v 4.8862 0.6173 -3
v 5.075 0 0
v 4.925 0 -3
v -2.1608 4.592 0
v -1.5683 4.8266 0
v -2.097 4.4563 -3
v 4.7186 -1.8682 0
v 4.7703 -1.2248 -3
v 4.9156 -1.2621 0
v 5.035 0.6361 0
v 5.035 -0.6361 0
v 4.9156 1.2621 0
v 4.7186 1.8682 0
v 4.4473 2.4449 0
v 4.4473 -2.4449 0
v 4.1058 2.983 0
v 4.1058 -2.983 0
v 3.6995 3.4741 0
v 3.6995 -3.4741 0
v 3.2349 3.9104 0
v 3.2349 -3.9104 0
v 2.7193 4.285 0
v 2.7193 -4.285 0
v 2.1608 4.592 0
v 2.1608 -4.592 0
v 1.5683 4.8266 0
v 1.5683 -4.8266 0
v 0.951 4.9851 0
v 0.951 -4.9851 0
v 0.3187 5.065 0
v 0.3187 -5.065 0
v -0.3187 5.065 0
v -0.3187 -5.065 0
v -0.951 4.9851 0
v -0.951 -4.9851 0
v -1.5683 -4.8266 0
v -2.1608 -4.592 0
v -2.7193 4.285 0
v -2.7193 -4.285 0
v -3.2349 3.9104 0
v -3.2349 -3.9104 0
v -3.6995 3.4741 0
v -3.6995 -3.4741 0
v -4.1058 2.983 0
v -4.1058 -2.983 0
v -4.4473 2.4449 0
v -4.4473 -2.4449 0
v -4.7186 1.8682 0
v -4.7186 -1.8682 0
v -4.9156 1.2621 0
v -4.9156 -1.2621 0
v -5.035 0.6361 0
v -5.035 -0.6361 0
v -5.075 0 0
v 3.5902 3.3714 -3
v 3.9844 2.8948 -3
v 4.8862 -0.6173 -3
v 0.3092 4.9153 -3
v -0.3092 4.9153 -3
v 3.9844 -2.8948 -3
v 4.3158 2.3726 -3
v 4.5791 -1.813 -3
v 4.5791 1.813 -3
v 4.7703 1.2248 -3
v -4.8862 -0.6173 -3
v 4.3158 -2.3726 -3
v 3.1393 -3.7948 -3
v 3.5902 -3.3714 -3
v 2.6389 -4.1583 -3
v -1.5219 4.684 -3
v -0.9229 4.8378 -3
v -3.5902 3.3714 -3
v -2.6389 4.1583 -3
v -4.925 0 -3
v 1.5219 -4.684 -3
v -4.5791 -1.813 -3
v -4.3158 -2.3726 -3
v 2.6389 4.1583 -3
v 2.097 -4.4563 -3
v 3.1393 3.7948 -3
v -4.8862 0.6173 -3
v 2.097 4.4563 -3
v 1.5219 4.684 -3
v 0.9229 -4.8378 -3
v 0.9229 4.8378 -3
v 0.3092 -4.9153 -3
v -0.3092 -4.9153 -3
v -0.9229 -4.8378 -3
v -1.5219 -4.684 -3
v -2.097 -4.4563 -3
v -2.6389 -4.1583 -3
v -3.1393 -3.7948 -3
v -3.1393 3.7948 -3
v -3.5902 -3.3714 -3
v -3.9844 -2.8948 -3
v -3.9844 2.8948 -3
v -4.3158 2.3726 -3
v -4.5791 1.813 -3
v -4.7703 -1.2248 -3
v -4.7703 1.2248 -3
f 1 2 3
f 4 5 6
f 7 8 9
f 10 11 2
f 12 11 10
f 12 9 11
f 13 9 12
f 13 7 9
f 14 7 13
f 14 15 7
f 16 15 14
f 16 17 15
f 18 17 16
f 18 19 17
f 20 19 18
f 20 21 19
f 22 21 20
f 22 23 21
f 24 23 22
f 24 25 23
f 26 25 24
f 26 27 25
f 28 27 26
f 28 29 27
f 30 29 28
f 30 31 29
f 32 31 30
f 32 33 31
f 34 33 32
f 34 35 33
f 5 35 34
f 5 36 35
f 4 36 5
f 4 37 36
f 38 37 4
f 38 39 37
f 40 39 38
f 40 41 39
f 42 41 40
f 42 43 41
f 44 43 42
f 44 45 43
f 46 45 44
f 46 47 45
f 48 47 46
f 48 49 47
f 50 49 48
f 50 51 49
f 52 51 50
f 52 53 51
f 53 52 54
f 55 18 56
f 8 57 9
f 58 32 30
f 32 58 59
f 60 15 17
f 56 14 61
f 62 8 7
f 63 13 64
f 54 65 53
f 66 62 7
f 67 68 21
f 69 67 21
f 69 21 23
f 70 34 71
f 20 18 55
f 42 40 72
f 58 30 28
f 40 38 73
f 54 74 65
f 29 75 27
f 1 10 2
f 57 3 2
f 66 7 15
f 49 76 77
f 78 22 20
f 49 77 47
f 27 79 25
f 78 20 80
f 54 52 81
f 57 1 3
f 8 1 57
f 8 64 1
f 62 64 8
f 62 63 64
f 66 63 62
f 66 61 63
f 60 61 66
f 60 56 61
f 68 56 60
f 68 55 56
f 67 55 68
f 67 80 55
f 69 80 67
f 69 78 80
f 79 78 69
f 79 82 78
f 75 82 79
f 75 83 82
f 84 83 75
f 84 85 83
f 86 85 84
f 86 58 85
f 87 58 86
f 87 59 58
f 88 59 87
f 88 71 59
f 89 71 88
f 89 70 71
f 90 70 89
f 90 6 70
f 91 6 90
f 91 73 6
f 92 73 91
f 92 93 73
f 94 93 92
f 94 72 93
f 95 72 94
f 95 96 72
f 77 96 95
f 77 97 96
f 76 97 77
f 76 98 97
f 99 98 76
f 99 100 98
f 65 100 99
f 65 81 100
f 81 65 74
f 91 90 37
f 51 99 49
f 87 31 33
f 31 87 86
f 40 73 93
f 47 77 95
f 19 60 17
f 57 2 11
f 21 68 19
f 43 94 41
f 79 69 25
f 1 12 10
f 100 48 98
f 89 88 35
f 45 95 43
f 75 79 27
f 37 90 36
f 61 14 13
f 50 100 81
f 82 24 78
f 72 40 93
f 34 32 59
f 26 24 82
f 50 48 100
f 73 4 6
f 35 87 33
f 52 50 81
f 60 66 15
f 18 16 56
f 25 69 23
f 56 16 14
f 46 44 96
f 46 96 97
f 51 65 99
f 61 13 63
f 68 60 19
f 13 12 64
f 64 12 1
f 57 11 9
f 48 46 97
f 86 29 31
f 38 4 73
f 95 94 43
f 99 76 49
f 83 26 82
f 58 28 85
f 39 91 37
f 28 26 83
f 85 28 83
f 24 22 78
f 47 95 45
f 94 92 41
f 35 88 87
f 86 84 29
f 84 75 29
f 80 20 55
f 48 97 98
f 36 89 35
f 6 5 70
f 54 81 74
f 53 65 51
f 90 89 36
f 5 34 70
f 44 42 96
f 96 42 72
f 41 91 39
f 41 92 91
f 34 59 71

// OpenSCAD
$fn = 50;


difference() {
	union() {
		translate(v = [0, 0, -3.0000000000]) {
			cylinder(h = 3, r1 = 4.9250000000, r2 = 5.0750000000);
		}
	}
	union();
}
